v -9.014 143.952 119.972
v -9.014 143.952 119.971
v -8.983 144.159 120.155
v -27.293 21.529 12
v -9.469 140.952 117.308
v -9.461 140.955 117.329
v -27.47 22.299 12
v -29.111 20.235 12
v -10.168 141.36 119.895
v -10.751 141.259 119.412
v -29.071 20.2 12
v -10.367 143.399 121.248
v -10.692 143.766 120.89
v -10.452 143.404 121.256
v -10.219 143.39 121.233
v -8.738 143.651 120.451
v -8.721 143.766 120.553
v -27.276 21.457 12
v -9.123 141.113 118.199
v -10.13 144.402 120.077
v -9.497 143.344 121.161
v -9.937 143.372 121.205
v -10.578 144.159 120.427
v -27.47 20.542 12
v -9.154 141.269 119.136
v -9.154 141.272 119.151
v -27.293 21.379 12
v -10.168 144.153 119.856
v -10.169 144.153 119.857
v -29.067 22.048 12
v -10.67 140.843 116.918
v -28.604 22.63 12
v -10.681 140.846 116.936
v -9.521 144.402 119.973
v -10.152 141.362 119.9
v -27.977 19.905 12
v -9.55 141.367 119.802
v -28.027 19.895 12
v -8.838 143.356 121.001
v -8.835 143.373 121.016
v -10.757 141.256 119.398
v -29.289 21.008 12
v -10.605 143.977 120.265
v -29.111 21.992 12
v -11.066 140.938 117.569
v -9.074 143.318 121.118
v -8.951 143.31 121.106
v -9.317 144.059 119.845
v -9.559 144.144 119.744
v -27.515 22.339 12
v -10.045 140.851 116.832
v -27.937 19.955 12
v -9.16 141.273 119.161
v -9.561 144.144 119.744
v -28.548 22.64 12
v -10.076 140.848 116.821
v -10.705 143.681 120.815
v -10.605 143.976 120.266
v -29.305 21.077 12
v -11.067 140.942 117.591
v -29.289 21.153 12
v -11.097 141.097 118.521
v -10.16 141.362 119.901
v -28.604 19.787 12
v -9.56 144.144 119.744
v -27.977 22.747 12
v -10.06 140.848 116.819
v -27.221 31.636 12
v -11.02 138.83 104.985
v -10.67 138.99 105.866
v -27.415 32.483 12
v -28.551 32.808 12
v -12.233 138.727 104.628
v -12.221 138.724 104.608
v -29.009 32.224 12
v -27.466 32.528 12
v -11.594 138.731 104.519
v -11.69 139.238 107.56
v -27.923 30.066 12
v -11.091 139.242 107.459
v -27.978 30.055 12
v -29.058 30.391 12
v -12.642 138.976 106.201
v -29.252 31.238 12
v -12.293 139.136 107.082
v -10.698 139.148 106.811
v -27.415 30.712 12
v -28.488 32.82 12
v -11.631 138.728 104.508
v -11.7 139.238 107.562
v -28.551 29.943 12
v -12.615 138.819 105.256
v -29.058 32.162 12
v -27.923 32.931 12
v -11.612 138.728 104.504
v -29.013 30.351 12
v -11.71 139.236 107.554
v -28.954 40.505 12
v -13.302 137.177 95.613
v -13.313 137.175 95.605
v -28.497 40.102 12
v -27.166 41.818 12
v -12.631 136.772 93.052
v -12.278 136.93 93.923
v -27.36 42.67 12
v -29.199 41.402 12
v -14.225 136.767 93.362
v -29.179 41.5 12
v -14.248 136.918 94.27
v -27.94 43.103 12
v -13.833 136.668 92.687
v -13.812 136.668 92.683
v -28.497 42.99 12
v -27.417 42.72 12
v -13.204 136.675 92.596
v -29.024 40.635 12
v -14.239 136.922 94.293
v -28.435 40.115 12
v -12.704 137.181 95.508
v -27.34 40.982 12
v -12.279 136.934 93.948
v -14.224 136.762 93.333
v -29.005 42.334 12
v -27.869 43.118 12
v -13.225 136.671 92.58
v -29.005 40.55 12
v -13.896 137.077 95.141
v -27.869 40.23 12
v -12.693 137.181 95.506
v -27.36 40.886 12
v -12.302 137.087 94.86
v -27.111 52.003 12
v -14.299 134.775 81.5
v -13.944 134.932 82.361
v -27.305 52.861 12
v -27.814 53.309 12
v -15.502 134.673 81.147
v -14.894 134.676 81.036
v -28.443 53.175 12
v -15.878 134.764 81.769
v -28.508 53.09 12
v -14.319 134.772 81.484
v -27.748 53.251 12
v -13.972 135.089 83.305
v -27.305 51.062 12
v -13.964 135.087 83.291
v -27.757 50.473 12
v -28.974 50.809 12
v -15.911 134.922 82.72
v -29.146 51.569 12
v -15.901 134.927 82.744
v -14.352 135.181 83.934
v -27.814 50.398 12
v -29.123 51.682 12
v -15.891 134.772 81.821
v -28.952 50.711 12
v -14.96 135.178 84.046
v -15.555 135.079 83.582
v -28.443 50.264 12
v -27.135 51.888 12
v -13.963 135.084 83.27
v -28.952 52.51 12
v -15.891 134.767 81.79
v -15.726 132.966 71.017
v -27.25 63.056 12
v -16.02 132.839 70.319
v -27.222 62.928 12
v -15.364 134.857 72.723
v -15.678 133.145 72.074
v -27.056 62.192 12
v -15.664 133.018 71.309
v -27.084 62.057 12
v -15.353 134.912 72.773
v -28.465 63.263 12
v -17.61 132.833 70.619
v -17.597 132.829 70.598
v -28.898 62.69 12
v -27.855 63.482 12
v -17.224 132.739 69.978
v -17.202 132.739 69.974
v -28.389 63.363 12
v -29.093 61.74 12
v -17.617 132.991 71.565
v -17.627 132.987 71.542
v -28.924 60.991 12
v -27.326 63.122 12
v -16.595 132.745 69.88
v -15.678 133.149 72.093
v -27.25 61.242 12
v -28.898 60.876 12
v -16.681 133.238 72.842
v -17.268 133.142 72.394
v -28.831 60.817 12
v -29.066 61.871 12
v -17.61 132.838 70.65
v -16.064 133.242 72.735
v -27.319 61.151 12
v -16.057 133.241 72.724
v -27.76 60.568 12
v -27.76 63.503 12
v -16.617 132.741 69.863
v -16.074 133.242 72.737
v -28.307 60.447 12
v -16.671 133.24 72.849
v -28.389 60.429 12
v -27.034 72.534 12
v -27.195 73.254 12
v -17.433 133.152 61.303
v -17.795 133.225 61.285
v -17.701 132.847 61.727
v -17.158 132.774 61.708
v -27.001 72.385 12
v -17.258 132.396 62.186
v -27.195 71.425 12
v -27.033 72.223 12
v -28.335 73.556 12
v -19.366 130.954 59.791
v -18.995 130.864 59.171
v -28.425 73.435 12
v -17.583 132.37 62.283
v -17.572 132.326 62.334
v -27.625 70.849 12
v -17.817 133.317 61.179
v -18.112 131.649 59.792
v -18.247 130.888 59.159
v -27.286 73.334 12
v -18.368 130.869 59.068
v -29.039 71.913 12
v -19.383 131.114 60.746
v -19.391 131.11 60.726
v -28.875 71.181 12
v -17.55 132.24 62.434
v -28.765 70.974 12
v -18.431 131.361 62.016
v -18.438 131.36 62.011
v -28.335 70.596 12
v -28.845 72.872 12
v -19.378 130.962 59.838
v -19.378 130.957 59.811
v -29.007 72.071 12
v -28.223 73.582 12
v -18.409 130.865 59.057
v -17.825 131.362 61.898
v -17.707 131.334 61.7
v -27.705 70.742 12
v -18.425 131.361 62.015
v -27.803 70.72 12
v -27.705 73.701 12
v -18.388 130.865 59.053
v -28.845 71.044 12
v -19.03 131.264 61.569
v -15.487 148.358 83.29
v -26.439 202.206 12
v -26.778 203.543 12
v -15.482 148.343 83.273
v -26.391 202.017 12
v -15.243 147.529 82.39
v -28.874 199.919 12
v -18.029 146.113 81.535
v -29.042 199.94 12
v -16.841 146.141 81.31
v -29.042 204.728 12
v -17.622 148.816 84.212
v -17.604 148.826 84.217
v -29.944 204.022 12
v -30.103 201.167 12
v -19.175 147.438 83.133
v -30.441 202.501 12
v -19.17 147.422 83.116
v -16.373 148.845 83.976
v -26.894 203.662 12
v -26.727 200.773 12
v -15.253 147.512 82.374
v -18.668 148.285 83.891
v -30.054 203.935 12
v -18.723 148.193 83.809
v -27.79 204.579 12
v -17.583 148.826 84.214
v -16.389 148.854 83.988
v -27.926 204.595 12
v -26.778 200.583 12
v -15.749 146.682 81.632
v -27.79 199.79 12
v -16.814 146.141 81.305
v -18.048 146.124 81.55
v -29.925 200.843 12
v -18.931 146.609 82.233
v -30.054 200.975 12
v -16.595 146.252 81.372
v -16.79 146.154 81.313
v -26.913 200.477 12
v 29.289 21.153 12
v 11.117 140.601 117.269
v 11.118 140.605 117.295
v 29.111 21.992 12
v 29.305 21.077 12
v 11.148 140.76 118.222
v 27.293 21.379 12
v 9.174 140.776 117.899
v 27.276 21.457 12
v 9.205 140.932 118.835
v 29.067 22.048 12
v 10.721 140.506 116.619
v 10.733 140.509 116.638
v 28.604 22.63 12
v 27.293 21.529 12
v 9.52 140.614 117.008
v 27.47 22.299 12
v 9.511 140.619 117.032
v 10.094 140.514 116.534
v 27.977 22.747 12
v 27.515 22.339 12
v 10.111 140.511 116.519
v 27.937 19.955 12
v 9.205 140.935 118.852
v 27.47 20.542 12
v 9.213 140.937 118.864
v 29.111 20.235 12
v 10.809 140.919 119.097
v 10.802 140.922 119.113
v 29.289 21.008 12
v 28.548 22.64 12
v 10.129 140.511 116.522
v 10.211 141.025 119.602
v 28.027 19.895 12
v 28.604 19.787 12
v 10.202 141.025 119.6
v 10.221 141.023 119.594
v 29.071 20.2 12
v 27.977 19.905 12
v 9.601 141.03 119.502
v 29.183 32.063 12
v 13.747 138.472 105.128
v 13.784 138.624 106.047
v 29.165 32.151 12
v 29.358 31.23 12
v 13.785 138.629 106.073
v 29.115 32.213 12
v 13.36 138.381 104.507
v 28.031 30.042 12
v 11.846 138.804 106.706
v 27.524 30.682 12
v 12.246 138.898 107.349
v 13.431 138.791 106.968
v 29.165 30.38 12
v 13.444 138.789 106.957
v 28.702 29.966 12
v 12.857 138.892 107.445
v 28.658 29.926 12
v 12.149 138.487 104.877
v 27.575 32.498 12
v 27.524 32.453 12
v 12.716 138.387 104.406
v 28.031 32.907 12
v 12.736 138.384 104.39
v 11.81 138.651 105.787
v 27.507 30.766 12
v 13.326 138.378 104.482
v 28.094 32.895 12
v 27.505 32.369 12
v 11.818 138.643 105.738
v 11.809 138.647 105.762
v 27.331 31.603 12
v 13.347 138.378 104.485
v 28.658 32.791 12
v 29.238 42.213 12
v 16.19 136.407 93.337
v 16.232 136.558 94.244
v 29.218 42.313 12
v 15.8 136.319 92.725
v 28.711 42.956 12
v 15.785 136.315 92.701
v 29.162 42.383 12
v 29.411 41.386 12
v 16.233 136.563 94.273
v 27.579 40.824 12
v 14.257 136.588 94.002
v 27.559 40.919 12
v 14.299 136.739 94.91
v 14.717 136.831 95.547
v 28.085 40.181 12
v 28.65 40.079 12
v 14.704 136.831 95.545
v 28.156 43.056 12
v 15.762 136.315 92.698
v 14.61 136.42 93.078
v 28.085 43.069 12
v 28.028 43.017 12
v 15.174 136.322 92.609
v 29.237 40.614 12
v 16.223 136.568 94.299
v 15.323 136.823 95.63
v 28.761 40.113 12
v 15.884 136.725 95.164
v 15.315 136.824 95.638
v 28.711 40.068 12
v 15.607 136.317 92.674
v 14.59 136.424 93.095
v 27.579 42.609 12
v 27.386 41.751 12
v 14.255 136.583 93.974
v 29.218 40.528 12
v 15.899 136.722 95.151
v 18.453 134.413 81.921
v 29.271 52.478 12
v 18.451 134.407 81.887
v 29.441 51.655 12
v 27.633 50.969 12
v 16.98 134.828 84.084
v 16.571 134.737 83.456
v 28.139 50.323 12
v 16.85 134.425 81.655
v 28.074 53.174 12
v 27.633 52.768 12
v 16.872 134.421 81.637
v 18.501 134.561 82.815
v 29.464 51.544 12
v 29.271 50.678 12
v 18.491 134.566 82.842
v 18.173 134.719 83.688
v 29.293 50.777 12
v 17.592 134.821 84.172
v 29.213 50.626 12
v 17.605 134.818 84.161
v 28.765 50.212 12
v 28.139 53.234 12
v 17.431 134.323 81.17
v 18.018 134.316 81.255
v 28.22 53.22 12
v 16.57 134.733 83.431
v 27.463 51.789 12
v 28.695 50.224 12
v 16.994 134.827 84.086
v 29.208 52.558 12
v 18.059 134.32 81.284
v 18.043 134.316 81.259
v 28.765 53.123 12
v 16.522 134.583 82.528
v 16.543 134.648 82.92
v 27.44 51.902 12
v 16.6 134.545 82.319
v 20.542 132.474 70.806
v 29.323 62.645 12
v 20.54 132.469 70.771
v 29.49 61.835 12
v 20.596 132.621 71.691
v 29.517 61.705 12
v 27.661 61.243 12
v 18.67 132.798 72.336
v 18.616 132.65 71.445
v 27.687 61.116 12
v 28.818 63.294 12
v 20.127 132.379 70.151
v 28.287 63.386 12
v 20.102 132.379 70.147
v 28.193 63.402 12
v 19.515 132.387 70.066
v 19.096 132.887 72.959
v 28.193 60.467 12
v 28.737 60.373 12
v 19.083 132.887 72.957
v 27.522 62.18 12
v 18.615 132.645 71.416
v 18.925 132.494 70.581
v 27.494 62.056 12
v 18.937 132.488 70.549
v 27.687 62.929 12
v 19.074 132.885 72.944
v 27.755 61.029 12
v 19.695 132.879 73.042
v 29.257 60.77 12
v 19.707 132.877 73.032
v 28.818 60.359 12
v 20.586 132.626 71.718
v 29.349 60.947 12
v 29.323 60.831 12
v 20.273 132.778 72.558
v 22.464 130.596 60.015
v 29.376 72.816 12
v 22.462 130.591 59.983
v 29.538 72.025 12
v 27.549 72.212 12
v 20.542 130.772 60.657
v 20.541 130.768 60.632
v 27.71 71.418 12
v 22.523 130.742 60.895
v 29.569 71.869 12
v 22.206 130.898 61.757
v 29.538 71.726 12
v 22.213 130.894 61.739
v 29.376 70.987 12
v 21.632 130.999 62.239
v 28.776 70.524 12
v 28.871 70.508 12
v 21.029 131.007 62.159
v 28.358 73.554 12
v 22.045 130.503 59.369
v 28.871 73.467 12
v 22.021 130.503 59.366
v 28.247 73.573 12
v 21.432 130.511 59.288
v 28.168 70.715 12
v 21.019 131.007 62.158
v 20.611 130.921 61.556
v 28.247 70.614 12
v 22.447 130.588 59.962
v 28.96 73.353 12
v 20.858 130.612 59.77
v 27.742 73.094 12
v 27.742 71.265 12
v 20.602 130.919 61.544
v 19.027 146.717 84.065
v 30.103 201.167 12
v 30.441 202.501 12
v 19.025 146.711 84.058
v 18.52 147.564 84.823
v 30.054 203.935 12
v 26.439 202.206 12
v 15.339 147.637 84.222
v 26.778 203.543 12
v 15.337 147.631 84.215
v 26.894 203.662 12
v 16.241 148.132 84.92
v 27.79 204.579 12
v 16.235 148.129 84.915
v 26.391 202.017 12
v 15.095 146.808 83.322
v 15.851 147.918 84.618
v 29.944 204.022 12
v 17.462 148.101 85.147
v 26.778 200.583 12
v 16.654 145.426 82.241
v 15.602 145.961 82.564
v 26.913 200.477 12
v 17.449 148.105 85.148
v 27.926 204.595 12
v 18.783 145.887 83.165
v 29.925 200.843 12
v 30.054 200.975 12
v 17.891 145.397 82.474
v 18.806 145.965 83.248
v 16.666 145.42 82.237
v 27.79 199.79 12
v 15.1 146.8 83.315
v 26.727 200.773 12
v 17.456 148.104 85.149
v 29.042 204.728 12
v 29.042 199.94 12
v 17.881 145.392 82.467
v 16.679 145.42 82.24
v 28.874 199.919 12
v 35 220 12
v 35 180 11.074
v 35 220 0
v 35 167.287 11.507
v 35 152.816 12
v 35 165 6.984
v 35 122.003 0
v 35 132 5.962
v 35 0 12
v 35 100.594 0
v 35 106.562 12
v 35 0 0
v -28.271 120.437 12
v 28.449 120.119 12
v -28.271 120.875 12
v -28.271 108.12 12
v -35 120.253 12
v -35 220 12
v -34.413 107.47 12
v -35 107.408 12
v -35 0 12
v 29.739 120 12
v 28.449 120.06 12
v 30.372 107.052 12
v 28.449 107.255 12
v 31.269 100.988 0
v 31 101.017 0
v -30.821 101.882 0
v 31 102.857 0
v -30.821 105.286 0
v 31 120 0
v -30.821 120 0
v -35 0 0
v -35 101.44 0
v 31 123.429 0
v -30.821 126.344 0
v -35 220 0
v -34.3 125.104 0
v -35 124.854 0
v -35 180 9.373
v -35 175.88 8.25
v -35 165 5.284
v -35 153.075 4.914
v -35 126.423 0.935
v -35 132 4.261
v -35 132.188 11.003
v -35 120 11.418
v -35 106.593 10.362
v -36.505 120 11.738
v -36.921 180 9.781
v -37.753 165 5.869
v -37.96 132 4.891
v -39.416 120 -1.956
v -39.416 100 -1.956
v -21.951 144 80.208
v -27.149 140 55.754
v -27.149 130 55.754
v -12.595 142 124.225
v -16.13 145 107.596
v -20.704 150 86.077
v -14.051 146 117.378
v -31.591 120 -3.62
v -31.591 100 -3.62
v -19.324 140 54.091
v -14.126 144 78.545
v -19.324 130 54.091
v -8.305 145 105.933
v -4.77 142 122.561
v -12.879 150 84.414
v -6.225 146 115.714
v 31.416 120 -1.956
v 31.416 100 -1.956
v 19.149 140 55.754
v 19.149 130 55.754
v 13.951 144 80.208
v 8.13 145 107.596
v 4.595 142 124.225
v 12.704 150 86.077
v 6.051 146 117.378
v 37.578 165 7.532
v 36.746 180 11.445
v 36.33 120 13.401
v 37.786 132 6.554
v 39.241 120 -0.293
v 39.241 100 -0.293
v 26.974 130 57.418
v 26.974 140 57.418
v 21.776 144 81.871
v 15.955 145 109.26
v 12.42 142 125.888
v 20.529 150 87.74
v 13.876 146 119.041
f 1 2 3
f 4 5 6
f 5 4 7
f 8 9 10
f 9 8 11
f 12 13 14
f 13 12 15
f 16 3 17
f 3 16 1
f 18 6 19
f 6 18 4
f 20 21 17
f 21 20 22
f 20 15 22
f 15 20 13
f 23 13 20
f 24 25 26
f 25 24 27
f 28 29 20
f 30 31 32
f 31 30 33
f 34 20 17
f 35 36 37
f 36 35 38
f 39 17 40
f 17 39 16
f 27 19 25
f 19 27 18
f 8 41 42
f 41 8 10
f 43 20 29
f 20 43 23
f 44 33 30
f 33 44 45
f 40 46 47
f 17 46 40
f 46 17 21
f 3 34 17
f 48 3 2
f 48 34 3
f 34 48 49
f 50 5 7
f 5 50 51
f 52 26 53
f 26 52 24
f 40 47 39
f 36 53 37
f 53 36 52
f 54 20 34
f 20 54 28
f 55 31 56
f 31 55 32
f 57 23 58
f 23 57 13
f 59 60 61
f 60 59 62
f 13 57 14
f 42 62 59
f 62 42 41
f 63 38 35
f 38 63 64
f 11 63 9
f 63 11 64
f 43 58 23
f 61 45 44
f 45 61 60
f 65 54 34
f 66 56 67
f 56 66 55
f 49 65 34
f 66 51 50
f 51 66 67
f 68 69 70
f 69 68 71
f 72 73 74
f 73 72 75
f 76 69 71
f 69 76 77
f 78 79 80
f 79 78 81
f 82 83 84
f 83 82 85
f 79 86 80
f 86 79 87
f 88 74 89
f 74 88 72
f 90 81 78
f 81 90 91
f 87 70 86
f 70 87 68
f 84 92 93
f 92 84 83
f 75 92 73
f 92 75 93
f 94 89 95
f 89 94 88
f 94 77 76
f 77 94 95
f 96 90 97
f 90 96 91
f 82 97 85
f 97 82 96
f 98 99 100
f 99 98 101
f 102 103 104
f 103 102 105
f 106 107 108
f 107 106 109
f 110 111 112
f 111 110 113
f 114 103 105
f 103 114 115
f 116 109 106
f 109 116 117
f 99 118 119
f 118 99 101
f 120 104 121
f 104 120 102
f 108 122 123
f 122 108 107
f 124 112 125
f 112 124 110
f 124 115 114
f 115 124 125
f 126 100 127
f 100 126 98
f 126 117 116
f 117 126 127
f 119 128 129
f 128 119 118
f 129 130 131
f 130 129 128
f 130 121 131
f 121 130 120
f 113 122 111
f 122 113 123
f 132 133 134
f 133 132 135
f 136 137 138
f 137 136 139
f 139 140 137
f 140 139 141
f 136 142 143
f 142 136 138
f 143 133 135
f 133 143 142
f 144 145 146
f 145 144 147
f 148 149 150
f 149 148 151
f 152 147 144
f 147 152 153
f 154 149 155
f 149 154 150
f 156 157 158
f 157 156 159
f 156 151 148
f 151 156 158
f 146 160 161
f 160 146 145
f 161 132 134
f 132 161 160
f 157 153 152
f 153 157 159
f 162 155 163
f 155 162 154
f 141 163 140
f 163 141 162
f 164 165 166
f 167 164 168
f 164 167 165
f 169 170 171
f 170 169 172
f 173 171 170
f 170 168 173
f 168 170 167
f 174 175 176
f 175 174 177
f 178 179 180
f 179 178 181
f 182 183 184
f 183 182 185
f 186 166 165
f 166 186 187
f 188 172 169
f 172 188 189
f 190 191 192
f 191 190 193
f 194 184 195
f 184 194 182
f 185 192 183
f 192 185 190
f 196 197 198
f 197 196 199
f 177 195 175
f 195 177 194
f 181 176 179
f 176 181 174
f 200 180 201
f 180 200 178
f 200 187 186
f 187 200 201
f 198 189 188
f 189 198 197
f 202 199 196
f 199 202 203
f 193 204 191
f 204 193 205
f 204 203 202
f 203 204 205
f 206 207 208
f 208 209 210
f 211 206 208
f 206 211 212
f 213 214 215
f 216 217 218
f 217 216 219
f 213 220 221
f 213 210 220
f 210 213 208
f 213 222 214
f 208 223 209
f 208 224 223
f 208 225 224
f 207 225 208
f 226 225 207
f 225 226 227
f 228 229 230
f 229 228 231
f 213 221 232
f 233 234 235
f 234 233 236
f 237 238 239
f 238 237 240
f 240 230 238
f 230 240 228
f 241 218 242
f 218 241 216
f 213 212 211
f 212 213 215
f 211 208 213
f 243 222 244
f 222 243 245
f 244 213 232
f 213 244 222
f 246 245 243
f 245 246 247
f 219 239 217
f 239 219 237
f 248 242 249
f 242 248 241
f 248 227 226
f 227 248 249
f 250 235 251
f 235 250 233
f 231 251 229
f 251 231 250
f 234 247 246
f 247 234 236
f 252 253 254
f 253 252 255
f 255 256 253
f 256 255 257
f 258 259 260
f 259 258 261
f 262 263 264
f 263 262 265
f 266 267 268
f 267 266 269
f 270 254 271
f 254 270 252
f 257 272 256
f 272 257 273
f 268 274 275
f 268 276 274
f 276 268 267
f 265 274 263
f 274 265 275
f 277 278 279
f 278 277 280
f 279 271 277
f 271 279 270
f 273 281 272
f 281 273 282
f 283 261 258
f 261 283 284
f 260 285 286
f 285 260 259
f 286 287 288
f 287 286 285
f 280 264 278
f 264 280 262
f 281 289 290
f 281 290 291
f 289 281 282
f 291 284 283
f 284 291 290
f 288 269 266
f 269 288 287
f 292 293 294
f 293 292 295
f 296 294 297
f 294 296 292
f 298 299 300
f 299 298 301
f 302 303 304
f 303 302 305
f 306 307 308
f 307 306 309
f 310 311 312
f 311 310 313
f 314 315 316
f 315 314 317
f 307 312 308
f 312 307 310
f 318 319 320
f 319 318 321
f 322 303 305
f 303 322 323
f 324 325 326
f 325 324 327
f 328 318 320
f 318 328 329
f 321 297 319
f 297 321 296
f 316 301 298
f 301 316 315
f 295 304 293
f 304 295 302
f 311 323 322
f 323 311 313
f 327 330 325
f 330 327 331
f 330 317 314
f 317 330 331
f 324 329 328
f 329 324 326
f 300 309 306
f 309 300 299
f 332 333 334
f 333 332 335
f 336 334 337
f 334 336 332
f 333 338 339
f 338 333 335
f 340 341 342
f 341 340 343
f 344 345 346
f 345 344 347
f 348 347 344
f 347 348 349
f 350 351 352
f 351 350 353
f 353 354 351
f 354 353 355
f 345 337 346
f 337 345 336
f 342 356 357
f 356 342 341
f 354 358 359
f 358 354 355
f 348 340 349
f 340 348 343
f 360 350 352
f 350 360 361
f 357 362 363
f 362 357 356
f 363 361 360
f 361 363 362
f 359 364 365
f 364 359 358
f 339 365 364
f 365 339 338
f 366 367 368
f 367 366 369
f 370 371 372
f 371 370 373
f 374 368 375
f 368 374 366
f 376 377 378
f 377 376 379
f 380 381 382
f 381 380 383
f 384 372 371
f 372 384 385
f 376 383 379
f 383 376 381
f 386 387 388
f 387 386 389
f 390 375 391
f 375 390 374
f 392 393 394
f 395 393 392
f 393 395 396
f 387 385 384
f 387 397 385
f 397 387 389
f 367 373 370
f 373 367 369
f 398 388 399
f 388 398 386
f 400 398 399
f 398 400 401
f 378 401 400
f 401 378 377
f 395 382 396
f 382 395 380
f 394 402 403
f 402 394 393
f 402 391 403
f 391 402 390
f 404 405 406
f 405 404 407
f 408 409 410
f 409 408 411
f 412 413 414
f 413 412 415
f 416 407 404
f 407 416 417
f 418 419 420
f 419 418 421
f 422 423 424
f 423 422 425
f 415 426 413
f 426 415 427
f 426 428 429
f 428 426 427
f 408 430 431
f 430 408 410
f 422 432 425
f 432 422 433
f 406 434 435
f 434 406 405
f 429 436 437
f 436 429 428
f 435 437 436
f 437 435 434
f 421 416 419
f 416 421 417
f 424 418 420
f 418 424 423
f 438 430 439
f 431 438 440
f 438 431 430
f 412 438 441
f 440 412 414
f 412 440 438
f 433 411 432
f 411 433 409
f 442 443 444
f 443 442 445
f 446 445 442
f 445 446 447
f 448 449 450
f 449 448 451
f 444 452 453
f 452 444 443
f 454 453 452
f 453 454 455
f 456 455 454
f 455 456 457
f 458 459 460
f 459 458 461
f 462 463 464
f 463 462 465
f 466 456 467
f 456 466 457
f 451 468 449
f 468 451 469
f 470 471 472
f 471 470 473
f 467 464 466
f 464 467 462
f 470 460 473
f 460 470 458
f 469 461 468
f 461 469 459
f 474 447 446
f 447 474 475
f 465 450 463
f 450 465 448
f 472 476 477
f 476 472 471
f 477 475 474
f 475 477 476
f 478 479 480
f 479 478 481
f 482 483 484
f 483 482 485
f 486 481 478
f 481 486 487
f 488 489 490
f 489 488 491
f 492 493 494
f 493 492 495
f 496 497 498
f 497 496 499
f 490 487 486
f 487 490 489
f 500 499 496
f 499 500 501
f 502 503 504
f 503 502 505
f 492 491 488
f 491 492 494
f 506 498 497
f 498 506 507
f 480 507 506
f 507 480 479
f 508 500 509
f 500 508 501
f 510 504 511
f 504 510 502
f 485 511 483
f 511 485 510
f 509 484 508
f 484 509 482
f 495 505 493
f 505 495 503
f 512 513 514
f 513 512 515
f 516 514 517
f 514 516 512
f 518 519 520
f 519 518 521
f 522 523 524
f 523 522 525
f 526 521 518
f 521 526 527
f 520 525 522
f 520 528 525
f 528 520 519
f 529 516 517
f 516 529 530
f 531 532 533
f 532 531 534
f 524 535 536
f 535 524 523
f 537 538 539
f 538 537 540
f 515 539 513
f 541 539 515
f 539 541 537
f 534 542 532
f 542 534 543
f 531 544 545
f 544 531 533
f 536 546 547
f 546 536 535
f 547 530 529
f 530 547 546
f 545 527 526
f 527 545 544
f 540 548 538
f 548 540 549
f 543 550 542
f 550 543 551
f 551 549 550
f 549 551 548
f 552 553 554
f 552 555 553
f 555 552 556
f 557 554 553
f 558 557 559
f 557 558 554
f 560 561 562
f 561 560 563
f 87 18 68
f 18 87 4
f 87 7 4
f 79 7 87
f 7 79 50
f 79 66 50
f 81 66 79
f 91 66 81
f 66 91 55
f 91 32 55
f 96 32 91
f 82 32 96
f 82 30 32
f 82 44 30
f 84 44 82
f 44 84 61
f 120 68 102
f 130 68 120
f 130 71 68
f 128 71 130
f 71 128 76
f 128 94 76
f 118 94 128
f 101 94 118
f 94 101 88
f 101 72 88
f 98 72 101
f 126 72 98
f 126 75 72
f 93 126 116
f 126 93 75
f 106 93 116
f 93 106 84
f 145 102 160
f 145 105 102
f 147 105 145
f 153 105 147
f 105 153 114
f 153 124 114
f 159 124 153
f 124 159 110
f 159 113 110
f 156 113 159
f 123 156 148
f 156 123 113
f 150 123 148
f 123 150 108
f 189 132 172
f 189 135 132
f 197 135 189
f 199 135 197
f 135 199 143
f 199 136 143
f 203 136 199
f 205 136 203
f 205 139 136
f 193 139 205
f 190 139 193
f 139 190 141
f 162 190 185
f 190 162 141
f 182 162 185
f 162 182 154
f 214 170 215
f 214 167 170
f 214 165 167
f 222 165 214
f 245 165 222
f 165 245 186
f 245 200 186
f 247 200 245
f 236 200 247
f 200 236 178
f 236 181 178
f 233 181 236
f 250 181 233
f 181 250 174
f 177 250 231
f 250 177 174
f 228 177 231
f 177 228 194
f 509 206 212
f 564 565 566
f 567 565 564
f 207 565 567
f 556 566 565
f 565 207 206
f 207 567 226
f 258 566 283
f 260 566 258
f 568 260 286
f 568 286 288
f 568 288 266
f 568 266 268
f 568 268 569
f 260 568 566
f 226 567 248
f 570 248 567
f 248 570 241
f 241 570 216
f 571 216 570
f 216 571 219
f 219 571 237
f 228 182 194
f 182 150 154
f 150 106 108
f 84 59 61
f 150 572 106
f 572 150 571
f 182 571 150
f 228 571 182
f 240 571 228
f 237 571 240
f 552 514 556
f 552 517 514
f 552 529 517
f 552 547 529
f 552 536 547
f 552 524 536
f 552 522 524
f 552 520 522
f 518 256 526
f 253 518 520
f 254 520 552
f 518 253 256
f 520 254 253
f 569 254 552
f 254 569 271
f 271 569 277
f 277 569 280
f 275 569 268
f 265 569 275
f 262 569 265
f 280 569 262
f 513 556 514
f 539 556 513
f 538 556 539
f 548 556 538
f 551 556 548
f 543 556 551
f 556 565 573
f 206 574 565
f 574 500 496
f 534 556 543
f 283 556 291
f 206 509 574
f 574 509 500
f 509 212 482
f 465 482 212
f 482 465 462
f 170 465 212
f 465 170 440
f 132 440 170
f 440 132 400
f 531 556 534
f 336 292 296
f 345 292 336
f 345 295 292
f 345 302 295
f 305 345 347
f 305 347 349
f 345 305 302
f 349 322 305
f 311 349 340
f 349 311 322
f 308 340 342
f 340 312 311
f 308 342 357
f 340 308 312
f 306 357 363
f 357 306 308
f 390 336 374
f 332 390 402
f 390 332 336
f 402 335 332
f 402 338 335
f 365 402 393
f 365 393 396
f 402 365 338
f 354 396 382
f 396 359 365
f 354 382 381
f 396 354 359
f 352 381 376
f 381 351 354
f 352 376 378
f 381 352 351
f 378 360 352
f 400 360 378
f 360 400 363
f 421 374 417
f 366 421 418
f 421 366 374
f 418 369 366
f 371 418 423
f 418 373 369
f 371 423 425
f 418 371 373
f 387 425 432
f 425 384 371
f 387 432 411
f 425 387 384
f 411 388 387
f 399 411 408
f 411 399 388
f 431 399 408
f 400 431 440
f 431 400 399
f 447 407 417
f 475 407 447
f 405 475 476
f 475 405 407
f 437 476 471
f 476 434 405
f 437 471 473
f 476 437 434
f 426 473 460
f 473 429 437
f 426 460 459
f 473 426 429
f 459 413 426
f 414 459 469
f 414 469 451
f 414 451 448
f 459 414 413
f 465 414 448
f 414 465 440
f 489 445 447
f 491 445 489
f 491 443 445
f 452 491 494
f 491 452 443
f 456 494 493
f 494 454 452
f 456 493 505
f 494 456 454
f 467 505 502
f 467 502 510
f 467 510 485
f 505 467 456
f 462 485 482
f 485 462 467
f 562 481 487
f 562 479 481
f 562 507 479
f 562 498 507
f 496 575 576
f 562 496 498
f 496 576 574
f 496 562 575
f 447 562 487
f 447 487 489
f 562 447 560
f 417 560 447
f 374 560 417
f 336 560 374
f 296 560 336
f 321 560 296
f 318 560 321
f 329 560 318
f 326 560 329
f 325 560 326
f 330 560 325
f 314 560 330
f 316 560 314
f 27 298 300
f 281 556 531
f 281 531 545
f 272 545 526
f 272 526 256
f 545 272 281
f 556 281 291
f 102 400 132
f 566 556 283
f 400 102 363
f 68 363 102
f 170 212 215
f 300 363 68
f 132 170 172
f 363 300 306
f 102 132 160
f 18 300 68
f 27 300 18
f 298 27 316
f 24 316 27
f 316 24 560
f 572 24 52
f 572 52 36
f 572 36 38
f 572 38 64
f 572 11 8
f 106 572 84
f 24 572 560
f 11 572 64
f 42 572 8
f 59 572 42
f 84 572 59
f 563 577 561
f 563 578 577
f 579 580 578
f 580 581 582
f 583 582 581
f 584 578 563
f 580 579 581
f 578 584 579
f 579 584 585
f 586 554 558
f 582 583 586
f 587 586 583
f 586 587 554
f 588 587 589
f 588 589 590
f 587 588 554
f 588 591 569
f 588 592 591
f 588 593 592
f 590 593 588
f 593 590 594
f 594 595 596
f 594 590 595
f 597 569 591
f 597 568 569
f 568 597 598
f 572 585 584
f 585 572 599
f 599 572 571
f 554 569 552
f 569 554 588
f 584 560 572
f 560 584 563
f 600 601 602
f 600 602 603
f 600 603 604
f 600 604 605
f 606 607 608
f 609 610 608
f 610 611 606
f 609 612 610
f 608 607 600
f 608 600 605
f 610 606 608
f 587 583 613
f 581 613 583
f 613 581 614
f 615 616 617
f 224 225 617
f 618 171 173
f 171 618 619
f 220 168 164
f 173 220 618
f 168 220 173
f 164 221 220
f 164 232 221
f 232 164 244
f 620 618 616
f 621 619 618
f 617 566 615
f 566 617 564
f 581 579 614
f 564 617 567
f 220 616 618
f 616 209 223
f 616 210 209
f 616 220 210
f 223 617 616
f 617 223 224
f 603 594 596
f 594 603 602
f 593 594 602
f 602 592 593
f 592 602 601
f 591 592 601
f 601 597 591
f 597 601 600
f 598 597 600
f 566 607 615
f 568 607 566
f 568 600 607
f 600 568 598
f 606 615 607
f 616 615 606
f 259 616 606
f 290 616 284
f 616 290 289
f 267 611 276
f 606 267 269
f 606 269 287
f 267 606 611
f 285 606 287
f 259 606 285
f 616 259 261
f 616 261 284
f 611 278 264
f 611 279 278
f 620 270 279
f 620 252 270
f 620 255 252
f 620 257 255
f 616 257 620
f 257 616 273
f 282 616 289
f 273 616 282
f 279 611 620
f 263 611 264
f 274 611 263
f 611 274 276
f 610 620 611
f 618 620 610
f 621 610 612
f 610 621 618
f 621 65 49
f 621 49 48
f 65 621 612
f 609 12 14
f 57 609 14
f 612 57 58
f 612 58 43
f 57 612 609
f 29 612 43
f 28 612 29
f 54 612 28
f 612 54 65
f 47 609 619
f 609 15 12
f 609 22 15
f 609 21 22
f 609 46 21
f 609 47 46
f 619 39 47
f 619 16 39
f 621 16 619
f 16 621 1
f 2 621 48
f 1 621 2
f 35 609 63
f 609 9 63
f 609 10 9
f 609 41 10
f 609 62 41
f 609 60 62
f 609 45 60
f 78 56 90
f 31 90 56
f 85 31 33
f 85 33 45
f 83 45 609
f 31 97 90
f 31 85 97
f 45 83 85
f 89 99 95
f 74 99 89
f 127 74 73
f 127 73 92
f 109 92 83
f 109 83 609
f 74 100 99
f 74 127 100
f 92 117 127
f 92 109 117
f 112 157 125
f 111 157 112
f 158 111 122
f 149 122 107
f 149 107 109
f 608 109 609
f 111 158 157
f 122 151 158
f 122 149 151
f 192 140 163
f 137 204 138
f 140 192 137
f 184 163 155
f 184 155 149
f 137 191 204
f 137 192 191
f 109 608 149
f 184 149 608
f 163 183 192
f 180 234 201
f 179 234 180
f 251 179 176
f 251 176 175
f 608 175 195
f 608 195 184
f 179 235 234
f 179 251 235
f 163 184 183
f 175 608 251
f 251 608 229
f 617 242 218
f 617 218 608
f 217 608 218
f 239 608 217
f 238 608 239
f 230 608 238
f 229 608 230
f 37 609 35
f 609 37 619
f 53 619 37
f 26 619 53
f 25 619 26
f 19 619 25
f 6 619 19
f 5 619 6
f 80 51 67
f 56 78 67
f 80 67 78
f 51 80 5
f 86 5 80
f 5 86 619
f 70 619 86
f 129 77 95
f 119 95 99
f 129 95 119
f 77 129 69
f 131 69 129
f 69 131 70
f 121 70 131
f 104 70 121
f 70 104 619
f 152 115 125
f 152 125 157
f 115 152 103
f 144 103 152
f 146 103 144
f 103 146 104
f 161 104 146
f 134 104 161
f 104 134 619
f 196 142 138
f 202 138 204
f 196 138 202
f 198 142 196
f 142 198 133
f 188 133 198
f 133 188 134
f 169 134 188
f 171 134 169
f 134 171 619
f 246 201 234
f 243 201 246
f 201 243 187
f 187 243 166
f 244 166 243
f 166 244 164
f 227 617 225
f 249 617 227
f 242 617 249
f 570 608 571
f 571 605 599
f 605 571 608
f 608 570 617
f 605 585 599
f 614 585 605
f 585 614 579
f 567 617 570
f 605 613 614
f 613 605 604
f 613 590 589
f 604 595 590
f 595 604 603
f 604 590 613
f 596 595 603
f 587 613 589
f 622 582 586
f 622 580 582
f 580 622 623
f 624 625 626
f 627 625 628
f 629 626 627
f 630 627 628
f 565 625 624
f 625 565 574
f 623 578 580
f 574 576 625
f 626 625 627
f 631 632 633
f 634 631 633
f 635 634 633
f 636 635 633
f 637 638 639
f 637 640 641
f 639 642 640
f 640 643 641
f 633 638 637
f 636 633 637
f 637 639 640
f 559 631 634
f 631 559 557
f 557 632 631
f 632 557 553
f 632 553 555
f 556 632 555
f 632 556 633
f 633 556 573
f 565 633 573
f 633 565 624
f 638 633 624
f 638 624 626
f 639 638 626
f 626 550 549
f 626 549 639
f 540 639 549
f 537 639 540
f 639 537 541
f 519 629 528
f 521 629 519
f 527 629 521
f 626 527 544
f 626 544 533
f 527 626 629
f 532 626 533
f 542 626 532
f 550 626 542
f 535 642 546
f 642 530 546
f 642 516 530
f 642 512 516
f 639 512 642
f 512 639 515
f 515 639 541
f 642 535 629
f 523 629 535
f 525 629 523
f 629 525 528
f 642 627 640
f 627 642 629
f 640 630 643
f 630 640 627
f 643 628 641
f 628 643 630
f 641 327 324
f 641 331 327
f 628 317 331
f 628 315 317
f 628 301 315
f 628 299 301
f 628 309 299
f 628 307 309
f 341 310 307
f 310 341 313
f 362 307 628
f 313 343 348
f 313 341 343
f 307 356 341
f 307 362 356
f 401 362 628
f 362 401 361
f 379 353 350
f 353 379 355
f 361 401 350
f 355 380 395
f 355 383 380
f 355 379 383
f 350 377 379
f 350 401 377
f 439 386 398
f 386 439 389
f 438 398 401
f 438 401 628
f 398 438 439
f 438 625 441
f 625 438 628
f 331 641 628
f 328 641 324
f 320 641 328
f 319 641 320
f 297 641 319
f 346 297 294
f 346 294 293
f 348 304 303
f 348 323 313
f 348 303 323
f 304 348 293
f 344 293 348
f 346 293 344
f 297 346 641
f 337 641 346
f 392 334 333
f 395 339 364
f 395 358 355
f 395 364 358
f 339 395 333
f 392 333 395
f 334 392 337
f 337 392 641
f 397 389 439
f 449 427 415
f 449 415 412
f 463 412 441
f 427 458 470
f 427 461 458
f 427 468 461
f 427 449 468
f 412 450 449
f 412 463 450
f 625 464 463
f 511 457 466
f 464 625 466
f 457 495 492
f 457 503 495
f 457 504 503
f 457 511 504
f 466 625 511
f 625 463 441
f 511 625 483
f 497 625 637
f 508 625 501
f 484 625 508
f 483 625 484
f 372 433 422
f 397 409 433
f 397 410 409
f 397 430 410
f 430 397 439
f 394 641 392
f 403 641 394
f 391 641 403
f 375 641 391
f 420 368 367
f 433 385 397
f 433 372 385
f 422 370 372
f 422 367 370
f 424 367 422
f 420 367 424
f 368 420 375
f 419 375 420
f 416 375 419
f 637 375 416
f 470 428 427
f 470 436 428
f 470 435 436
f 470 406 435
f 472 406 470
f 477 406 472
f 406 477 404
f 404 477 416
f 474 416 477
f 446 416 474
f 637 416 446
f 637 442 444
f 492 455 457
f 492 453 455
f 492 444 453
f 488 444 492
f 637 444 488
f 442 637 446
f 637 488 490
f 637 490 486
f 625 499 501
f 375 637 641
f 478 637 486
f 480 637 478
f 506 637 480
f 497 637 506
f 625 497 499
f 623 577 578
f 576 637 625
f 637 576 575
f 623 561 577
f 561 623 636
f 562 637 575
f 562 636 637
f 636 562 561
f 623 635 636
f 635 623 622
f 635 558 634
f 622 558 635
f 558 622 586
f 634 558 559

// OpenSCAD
$fn = 10;

translate([-35, 0, 0]) {
  renderBase();
}

translate([-35 - 8 / 2, 100, 0]) {
  renderArm(-1);
}

translate([-30, 0, 2]) {
  renderFrontCables(-1);
  renderRearCable(-1);
}

translate([35 - 8 / 2, 100, 0]) {
  renderArm(1);
}

translate([30, 0, 2]) {
  renderFrontCables(1);
  renderRearCable(1);
}

module renderArm(multiplier) {
  rotate([90 - 12 * multiplier, 0, 90]) {
    linear_extrude(8) {
      polygon(
        [
          [0, -2],
          [20, -2],
          [32, 5],
          [65, 6],
          [80, 12 - 2],
          [20, 12],
          [40, 12 + 45],
          [44, 12 + 70],
          [50, 12 + 76],
          [45, 12 + 98],
          [46, 12 + 108],
          [42, 12 + 115],
          [30, 12 + 45],
        ]
      );
    }
  }
}

module renderBase() {
  cube([70, 220, 12]);
}

module renderFrontCables(multiplier) {
  for (i = [0:5]) {
    translate([0, 10 + 10 * i, 0]) {
      rotate([-48 - i * .4, -9.7 * multiplier + .3 * i, 0]) {
        cylinder(h=180 - 17 * i, d=2);
      }
    }
  }
}

module renderRearCable(multiplier) {
  translate([0, 210, 0]) {
    rotate([37.4, -9 * multiplier, 0]) {
      cylinder(h=105, d=4);
    }
  }
}
